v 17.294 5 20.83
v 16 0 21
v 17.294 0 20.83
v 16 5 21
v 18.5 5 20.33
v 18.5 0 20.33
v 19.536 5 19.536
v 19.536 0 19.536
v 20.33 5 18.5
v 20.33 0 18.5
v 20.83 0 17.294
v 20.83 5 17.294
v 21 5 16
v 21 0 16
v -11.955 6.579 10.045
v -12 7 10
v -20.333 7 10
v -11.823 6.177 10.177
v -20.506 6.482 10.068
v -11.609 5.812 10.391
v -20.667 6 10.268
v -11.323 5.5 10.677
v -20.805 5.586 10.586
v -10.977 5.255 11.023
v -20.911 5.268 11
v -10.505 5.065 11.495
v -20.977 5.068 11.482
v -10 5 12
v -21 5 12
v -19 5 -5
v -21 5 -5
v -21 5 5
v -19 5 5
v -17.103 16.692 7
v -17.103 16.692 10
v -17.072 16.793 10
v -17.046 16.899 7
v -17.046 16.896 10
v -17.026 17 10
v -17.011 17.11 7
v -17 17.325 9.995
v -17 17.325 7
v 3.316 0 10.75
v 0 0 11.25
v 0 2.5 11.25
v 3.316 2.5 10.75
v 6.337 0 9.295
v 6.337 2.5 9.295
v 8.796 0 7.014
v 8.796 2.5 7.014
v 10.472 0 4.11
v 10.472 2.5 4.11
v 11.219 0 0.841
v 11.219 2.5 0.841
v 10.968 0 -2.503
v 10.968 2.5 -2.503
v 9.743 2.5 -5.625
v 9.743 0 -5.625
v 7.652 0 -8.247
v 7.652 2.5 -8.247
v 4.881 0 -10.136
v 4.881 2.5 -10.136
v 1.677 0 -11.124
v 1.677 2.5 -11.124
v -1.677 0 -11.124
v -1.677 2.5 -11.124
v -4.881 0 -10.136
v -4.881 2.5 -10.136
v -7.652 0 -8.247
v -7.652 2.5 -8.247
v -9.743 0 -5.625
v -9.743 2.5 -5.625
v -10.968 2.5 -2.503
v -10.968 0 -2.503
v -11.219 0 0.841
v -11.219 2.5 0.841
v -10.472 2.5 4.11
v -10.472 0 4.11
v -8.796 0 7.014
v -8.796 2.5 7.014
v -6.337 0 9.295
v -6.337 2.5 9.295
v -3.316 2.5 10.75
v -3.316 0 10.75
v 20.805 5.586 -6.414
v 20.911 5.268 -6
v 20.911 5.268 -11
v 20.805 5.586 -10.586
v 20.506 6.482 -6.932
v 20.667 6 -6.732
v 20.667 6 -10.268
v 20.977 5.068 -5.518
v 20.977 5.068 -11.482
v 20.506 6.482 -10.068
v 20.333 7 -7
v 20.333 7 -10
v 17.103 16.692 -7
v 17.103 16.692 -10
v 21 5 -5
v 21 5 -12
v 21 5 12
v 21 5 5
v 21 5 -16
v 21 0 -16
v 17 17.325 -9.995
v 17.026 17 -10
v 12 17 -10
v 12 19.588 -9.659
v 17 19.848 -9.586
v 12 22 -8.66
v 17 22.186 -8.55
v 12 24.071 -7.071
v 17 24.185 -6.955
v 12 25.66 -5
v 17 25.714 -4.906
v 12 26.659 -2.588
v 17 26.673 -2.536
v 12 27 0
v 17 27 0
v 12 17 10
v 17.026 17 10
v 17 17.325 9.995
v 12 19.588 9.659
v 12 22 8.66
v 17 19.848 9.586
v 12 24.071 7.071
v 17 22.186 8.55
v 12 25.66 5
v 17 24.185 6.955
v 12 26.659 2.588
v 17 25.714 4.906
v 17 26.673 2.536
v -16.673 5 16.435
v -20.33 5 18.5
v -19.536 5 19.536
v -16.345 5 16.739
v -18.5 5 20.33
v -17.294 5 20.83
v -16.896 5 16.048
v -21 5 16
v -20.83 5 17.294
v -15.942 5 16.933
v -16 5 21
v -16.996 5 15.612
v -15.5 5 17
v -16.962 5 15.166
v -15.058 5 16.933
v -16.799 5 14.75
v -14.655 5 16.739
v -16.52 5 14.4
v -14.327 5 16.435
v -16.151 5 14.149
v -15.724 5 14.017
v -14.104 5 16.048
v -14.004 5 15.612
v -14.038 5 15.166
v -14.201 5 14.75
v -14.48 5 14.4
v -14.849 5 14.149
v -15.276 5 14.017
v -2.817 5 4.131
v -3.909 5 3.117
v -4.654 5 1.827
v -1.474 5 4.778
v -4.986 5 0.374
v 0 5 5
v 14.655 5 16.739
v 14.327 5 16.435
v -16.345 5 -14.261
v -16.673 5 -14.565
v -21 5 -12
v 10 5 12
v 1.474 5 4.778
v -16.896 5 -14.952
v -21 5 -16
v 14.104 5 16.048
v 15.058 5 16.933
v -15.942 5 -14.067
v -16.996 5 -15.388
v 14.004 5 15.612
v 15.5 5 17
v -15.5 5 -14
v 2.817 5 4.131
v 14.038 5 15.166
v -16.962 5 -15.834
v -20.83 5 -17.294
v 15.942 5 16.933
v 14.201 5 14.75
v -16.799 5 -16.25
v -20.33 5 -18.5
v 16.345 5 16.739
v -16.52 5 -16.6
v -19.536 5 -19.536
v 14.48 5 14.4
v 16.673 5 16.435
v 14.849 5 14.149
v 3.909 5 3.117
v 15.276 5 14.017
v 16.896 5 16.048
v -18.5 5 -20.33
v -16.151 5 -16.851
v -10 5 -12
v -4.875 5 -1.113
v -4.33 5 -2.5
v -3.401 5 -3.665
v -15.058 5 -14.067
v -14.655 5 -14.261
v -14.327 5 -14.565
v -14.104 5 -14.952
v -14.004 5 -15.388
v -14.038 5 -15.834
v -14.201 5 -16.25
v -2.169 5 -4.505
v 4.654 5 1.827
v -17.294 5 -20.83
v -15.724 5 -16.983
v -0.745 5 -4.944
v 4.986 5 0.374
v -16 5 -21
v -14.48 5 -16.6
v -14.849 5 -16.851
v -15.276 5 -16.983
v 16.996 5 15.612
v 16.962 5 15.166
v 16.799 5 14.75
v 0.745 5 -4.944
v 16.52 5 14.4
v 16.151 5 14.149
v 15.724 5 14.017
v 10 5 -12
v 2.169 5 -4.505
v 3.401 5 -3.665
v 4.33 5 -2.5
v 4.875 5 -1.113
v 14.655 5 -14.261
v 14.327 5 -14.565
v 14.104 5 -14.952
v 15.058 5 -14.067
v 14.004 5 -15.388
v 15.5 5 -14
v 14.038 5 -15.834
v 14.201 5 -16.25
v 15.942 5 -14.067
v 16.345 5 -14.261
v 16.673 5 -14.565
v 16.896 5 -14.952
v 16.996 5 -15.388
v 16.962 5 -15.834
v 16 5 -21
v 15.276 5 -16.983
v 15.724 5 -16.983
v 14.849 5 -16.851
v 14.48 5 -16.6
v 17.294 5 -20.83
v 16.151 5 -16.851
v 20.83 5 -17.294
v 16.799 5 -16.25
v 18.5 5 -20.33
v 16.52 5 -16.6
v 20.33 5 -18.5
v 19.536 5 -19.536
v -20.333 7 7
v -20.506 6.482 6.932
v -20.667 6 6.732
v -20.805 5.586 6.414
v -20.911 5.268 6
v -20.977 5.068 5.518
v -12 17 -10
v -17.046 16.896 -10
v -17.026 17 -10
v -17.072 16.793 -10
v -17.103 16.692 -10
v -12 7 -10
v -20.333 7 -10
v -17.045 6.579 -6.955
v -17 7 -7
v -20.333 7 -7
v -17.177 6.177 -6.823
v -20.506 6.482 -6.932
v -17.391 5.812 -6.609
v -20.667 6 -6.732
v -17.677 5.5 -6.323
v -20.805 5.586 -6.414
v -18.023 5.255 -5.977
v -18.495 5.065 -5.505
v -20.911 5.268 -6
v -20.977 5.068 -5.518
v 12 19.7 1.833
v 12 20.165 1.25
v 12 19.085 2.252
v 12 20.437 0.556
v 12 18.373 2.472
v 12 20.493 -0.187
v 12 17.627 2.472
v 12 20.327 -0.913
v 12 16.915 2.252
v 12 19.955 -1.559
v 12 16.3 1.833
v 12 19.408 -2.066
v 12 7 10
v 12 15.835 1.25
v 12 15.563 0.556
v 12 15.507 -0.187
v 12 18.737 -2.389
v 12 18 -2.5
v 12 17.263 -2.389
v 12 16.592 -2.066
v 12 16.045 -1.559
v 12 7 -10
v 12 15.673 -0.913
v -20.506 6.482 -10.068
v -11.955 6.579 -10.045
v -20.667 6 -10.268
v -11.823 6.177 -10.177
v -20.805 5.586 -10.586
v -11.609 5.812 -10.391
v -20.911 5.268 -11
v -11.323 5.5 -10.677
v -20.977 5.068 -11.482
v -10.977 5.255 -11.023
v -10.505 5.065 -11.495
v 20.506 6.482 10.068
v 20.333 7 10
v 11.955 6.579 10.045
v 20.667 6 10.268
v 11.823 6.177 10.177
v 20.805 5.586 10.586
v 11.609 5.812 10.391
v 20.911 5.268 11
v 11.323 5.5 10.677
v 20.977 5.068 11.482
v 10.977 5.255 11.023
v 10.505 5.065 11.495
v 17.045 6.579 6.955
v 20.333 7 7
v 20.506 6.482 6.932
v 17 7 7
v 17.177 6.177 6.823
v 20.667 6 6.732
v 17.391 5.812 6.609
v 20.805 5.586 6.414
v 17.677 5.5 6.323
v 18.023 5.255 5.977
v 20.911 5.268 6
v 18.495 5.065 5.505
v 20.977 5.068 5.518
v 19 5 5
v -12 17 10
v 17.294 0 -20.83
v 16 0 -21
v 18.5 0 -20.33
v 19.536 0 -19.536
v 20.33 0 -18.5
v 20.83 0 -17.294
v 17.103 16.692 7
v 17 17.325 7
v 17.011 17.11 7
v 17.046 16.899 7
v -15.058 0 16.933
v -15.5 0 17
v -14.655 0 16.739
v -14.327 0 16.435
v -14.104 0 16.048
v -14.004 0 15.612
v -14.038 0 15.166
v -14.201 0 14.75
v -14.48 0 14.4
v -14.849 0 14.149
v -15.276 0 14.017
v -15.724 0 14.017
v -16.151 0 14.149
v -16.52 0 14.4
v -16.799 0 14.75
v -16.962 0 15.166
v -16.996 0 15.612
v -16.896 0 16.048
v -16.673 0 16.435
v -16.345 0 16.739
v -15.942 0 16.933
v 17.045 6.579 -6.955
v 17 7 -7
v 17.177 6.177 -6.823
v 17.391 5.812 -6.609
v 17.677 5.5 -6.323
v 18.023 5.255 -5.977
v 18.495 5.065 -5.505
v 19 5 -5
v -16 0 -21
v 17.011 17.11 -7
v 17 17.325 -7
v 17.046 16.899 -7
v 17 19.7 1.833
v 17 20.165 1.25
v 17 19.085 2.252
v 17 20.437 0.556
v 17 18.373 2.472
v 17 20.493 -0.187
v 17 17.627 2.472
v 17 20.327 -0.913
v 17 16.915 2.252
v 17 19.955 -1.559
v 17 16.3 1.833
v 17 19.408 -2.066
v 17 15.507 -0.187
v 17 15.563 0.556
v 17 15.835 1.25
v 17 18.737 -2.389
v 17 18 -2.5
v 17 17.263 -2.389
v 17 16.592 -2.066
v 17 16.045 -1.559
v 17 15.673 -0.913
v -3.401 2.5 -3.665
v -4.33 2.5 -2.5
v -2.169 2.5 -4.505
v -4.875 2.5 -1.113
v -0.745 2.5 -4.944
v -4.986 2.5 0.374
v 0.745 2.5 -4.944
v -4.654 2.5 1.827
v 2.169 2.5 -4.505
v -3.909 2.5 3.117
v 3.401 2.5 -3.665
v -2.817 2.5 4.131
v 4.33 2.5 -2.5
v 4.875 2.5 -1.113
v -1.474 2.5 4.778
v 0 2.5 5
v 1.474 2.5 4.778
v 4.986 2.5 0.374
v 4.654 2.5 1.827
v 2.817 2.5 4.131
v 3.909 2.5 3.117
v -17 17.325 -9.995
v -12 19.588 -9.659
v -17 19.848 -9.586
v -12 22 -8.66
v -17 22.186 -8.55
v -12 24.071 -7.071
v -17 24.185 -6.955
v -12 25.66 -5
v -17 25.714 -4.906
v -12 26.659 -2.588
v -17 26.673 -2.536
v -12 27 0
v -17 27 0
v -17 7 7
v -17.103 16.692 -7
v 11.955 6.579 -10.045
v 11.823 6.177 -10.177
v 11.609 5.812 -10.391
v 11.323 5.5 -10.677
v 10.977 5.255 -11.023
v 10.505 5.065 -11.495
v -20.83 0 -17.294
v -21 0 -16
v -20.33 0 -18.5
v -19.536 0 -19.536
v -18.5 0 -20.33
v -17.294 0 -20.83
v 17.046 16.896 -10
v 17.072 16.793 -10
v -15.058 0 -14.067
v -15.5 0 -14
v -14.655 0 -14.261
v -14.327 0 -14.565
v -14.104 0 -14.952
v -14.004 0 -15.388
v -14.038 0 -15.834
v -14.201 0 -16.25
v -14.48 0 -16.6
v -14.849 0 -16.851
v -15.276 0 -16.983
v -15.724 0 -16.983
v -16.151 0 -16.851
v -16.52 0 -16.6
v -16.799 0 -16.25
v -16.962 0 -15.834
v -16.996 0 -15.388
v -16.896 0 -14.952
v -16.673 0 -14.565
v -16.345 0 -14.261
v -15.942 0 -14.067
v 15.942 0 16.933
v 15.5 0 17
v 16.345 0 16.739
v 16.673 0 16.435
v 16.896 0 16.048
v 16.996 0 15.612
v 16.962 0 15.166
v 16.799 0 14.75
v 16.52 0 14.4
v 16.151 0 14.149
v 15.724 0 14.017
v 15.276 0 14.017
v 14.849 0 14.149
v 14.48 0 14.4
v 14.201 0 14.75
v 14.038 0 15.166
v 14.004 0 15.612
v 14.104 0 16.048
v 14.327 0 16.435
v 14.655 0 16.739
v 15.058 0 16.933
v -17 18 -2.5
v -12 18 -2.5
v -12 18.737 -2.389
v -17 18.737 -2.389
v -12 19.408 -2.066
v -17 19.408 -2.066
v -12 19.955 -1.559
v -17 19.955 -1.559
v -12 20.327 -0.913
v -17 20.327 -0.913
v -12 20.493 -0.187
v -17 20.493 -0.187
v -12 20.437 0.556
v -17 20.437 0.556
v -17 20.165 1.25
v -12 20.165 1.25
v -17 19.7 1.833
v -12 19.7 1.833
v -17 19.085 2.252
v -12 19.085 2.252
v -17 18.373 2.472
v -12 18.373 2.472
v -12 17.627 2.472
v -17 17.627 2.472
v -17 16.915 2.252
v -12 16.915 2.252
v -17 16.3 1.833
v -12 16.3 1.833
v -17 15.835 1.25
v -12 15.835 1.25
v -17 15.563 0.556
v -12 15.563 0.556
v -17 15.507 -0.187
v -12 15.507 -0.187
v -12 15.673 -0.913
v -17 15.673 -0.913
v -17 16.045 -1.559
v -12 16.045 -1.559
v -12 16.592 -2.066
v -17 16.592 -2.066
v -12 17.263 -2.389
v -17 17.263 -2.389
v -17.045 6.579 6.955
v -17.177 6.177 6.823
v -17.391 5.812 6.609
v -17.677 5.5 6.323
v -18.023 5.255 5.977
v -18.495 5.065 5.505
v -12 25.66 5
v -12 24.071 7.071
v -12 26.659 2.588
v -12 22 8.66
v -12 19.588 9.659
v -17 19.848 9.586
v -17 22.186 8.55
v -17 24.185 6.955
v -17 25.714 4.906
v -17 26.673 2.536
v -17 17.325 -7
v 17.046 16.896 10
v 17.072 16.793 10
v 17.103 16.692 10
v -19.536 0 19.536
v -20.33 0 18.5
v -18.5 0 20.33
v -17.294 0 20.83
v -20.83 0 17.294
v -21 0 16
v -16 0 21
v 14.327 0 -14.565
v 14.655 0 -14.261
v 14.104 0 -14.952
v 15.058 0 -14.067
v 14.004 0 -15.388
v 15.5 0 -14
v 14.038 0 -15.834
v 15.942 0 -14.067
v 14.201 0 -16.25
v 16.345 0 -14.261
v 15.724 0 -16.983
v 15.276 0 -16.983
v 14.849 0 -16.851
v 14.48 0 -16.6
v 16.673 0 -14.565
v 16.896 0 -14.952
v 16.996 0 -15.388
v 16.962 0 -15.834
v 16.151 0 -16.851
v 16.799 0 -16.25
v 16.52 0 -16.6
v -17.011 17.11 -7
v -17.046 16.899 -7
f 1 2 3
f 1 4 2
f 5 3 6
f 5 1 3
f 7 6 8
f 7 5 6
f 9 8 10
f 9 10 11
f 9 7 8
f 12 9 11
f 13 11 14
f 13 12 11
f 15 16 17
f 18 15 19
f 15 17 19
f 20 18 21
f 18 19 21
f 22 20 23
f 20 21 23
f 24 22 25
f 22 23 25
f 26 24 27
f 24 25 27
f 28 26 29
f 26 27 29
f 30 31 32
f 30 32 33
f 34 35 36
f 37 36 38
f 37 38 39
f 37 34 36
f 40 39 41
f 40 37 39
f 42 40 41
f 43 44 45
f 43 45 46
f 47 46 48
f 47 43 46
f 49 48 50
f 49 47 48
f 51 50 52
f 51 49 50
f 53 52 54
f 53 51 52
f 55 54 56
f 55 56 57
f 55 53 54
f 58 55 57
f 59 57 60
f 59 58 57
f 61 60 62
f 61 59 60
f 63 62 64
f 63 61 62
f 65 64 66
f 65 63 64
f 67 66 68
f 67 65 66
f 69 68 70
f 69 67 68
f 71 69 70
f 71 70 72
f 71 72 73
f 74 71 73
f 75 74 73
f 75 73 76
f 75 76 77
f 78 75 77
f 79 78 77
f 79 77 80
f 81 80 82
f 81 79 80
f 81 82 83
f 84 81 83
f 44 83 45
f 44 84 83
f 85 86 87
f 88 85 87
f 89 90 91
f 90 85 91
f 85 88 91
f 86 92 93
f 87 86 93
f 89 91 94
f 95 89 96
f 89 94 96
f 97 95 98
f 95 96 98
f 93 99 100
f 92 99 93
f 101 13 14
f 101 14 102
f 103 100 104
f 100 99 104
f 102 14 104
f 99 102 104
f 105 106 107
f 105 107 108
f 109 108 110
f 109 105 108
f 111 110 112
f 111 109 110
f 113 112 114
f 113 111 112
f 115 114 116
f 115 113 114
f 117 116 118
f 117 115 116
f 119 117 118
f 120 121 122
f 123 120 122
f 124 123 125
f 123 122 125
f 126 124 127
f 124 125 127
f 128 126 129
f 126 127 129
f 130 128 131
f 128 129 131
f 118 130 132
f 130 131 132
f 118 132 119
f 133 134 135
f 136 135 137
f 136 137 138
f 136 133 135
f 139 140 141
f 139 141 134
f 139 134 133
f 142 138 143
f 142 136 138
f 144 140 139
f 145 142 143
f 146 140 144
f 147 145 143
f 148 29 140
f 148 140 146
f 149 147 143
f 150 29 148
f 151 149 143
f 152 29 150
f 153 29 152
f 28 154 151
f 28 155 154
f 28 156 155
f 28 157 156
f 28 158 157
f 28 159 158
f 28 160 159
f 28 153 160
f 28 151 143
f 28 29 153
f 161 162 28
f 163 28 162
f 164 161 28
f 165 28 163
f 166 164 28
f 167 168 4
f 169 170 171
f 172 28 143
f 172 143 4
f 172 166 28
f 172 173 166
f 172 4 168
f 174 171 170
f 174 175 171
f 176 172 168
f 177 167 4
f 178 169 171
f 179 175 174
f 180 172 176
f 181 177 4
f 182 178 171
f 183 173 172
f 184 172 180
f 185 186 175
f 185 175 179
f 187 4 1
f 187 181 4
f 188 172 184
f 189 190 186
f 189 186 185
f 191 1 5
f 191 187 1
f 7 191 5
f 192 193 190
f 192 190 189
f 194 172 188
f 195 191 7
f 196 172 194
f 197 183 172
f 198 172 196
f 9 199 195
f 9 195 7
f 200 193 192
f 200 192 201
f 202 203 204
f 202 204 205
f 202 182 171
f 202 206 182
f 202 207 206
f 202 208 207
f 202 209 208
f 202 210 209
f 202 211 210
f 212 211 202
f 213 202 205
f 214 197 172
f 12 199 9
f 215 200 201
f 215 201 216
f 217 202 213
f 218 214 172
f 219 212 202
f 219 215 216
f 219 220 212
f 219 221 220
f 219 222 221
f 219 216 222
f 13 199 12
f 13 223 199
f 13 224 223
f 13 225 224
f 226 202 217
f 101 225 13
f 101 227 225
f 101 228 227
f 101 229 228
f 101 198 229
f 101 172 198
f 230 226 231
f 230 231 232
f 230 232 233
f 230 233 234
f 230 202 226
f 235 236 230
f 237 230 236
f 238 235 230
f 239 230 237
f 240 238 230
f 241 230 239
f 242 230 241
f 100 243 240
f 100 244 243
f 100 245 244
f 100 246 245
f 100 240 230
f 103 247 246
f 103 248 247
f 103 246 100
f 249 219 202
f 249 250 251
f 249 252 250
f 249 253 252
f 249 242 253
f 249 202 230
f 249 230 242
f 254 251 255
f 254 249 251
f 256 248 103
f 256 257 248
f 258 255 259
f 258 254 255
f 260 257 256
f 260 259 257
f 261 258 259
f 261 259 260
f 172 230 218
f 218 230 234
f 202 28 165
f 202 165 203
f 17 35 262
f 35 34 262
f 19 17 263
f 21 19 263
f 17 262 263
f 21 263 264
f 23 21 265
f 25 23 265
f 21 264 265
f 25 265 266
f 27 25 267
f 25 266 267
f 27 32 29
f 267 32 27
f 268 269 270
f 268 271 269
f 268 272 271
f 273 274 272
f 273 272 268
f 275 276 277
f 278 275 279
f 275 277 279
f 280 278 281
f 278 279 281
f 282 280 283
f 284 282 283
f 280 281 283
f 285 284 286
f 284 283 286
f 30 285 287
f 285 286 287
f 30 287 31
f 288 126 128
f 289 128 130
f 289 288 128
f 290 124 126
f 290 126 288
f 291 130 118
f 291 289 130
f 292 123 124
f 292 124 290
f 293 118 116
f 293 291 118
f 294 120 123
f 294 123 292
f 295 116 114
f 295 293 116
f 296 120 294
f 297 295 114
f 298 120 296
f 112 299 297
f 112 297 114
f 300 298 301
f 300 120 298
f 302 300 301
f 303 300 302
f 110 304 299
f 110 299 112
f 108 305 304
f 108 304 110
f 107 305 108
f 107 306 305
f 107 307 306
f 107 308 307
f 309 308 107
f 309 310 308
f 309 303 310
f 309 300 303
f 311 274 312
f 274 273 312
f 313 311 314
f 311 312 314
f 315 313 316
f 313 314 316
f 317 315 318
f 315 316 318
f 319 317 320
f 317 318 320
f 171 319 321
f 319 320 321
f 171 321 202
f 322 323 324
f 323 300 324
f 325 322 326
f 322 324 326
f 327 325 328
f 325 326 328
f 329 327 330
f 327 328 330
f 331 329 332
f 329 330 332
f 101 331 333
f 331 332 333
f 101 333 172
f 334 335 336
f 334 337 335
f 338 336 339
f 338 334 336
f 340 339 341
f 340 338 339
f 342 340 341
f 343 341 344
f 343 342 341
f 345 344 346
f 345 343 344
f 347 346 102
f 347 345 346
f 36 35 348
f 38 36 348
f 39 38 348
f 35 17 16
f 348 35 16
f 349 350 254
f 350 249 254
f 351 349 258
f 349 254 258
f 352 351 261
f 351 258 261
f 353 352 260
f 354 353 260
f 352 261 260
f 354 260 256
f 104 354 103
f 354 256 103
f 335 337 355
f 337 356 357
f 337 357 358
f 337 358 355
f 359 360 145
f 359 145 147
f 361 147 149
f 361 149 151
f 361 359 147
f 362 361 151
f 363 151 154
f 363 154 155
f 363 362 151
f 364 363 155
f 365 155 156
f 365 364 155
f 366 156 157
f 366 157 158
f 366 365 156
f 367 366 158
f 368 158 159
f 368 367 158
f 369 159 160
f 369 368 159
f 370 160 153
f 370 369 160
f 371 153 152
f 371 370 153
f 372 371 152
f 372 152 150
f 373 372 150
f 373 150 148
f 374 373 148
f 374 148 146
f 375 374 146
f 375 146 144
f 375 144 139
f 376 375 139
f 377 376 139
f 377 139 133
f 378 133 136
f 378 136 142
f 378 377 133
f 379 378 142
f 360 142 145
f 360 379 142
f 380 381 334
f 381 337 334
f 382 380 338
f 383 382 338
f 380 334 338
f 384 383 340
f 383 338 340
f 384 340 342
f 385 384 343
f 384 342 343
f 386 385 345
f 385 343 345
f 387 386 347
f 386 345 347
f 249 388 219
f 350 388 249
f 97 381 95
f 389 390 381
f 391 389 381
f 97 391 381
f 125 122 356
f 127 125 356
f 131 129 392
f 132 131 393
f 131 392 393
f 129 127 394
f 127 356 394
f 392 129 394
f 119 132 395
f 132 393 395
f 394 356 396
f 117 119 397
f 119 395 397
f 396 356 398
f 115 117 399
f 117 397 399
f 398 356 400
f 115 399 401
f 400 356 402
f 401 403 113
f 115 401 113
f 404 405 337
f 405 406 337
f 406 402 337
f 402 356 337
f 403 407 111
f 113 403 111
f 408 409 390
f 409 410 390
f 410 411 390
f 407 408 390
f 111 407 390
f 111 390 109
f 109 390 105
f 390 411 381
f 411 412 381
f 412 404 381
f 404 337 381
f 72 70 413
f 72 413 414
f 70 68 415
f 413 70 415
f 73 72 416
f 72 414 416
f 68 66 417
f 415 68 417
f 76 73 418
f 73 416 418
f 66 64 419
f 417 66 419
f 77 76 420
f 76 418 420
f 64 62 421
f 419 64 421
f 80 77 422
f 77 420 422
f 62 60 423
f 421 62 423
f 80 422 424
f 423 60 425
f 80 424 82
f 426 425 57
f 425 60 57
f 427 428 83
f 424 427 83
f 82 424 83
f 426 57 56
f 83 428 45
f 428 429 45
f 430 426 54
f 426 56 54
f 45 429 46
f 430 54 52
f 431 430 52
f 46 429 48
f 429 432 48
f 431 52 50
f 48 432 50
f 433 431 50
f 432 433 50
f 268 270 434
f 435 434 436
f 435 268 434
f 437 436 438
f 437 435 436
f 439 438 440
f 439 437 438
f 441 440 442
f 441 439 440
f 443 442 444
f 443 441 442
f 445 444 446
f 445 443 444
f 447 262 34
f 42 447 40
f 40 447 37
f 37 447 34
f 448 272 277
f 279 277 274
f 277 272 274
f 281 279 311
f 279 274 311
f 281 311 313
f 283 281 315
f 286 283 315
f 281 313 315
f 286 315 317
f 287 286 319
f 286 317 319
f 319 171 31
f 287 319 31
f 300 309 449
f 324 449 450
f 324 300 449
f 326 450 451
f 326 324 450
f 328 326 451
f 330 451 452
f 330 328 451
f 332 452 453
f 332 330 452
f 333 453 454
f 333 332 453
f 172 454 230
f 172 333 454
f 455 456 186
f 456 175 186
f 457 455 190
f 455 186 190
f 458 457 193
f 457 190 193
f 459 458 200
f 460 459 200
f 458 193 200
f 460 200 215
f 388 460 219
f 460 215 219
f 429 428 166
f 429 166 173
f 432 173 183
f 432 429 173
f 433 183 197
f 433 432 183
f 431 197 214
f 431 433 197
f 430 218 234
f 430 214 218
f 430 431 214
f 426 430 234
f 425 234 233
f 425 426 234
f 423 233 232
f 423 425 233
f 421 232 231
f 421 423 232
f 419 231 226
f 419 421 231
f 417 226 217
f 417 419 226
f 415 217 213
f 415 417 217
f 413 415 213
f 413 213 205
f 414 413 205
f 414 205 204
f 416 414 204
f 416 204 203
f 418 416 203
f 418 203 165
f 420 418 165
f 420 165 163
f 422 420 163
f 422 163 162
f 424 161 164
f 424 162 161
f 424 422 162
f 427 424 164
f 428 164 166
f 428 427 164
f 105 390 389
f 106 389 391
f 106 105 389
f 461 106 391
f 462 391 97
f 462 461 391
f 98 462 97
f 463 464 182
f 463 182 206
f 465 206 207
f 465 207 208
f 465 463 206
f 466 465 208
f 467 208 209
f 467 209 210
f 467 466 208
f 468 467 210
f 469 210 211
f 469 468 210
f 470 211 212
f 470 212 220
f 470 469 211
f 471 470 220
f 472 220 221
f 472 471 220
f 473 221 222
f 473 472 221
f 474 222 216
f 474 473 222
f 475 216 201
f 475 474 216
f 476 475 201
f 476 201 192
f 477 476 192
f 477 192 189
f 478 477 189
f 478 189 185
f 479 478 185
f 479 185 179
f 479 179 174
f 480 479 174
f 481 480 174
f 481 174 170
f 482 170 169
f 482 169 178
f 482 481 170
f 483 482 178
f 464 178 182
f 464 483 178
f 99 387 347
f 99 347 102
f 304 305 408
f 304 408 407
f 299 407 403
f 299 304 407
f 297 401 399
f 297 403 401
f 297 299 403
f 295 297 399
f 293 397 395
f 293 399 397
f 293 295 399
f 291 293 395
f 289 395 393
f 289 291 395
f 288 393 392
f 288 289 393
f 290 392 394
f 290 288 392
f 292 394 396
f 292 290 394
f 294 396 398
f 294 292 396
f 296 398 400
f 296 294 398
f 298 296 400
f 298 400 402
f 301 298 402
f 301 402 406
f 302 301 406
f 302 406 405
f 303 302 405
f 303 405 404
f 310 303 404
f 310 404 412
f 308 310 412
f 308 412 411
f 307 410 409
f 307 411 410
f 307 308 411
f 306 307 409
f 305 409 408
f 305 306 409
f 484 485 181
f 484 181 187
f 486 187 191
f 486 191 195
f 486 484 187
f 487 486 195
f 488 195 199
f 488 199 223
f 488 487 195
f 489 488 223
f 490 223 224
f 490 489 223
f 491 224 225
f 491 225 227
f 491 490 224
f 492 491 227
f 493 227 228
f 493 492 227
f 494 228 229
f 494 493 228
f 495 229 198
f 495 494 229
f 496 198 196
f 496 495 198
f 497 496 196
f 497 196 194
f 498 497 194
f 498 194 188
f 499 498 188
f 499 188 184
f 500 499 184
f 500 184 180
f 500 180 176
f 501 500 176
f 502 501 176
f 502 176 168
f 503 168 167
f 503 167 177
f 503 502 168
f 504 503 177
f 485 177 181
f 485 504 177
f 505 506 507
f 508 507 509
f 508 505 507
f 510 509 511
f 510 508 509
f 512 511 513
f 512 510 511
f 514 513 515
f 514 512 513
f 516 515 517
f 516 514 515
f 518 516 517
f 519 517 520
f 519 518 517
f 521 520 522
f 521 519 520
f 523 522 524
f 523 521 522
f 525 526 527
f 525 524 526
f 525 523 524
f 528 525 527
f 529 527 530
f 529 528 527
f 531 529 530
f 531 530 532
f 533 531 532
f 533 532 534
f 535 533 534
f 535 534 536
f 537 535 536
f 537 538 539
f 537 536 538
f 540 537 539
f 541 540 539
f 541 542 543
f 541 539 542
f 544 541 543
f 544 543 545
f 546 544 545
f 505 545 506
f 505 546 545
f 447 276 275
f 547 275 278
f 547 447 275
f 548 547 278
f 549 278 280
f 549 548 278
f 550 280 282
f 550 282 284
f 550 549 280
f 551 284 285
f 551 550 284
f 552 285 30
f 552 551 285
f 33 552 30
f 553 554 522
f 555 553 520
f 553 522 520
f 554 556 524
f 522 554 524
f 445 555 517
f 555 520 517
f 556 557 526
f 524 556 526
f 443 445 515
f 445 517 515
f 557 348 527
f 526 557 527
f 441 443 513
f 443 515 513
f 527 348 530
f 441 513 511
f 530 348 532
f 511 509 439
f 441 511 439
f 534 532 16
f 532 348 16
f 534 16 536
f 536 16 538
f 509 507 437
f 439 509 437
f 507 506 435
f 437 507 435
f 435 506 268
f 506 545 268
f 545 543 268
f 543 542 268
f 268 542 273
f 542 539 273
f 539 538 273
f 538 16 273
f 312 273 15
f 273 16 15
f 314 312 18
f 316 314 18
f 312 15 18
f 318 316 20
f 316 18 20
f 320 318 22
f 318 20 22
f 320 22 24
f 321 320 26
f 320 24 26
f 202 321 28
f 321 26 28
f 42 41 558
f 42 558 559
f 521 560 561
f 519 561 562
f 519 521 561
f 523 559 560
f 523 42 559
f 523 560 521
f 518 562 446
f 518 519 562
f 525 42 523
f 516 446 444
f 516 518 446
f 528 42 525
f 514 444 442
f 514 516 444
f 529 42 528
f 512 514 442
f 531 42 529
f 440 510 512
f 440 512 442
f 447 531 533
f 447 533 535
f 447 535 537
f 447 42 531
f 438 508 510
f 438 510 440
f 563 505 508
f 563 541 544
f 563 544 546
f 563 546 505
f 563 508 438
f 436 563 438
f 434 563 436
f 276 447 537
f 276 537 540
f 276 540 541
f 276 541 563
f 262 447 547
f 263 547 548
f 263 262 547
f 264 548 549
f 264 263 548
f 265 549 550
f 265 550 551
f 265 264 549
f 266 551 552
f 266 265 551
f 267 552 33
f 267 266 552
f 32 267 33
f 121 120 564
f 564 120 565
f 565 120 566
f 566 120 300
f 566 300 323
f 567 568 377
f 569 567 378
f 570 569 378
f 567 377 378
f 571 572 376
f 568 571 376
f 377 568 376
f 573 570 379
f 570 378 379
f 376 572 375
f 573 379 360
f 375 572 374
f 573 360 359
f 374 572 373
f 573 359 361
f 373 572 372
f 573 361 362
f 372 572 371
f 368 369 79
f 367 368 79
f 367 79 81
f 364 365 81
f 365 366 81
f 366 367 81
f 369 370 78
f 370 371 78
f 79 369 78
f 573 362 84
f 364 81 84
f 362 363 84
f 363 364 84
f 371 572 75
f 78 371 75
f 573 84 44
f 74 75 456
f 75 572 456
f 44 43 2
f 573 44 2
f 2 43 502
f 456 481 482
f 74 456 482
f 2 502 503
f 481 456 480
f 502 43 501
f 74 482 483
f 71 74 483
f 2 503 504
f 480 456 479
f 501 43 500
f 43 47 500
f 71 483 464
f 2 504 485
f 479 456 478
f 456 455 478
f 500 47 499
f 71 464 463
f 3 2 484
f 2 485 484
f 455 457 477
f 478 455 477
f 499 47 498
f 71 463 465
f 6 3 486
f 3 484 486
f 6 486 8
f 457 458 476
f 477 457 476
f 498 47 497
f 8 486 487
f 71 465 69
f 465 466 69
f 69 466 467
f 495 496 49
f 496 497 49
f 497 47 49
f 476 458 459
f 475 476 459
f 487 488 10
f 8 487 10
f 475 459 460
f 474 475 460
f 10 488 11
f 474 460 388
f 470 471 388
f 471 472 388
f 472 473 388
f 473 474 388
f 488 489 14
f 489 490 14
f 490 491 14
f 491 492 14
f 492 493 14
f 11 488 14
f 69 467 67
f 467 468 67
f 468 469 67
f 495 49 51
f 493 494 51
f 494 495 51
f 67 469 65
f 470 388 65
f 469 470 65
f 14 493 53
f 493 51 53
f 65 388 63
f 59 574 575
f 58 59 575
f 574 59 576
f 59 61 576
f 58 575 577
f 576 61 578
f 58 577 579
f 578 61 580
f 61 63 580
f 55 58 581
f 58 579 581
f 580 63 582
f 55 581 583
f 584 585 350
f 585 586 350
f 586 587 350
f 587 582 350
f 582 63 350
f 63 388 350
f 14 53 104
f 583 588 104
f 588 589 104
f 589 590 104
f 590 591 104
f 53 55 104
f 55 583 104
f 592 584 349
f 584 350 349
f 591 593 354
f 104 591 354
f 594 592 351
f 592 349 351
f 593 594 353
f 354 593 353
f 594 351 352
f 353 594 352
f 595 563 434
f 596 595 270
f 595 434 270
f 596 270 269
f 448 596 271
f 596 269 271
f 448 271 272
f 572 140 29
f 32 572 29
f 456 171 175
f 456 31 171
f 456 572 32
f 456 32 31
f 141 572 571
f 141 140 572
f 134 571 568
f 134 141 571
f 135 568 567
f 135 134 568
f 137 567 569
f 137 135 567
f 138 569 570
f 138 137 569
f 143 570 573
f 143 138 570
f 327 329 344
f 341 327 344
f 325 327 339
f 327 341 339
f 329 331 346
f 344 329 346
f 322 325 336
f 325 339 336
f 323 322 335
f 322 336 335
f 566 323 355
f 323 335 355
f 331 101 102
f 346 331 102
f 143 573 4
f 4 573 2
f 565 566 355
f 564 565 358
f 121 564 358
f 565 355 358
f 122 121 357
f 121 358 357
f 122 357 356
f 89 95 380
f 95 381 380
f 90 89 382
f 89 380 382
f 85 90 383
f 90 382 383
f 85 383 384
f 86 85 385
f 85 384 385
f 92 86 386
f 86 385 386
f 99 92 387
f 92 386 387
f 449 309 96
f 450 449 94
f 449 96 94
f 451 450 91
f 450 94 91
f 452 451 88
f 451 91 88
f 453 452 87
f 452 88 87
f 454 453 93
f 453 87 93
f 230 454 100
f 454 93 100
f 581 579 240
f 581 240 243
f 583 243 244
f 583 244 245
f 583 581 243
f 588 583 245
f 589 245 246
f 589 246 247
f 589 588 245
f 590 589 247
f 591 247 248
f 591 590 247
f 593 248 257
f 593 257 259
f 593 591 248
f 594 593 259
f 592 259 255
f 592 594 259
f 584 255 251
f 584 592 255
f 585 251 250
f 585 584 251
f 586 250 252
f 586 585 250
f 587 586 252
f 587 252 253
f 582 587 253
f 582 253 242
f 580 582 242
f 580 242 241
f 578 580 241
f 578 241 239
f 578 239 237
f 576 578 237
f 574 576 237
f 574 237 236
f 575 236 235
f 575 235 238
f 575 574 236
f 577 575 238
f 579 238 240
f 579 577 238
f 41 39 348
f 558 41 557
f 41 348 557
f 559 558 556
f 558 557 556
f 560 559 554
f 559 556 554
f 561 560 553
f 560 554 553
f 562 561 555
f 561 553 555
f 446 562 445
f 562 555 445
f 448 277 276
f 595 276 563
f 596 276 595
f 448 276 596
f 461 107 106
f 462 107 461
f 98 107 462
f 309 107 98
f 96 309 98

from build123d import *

# Parameters (mm, degrees)
SKETCH1_W               = 42
SKETCH1_H               = 42
SKETCH1_R               = 1.5
BOSS_EXTRUDE1_DEPTH     = 5
SKETCH2_W               = 5
SKETCH2_H               = 20
BOSS_EXTRUDE2_DEPTH     = 27
CUT_EXTRUDE1_DEPTH      = 41.137264481
CUT_EXTRUDE1_DEPTH_BACK = 41.137264481
SKETCH3_R               = 2.5
FILLET1_R               = 10
FILLET2_R               = 5
SKETCH4_R               = 11.25
CUT_EXTRUDE2_DEPTH      = 2.5
SKETCH5_R               = 5
CUT_EXTRUDE3_DEPTH      = 10
SKETCH6_W               = 4
SKETCH6_H               = 3
BOSS_EXTRUDE3_DEPTH     = 17
CUT_EXTRUDE4_DEPTH      = 41.137264481
CUT_EXTRUDE4_DEPTH_BACK = 41.137264481
FILLET3_R               = 2


with BuildPart() as part:
    # Sketch1 → Boss-Extrude1 (new body)
    with BuildSketch(Plane(origin=(0, 0, 0), x_dir=(1, 0, 0), z_dir=(0, 1, 0))):
        Rectangle(SKETCH1_W, SKETCH1_H)
        with Locations(Location((-15.5, 15.5, 0), (0, 0, 270))):
            Circle(SKETCH1_R, mode=Mode.SUBTRACT)
        with Locations(Location((15.5, 15.5, 0), (0, 0, 270))):
            Circle(SKETCH1_R, mode=Mode.SUBTRACT)
        with Locations(Location((15.5, -15.5, 0), (0, 0, 270))):
            Circle(SKETCH1_R, mode=Mode.SUBTRACT)
        with Locations(Location((-15.5, -15.5, 0), (0, 0, 270))):
            Circle(SKETCH1_R, mode=Mode.SUBTRACT)
    extrude(amount=BOSS_EXTRUDE1_DEPTH)

    # Sketch2 → Boss-Extrude2 (add)
    with BuildSketch(Plane(origin=(0, 0, 0), x_dir=(1, 0, 0), z_dir=(0, 1, 0))):
        with Locations((-14.5, 0)):
            Rectangle(SKETCH2_W, SKETCH2_H)
        with Locations((14.5, 0)):
            Rectangle(SKETCH2_W, SKETCH2_H)
    extrude(amount=BOSS_EXTRUDE2_DEPTH)

    # Sketch3 → Cut-Extrude1 (cut, two sides: drawn at the far end of the back side and taken through both)
    with BuildSketch(Plane(origin=(0, 0, 0), x_dir=(0, 0, -1), z_dir=(1, 0, 0)).offset(-CUT_EXTRUDE1_DEPTH_BACK)):
        with Locations((0, 18)):
            Circle(SKETCH3_R)
    extrude(amount=CUT_EXTRUDE1_DEPTH + CUT_EXTRUDE1_DEPTH_BACK, mode=Mode.SUBTRACT)

    # Fillet1
    fillet1_edges = [part.edges().sort_by_distance(p)[0] for p in [
        (-14.5, 27, 10),
        (-14.5, 27, -10),
        (14.5, 27, -10),
        (14.5, 27, 10),
    ]]
    fillet(fillet1_edges, radius=FILLET1_R - 0.0001)  # a hair under: the kernel refuses the full size

    # Fillet2
    fillet2_edges = [part.edges().sort_by_distance(p)[0] for p in [
        (21, 2.5, 21),
        (-21, 2.5, 21),
        (-21, 2.5, -21),
        (21, 2.5, -21),
    ]]
    fillet(fillet2_edges, radius=FILLET2_R)

    # Sketch4 → Cut-Extrude2 (cut)
    with BuildSketch(Plane(origin=(0, 0, 0), x_dir=(1, 0, 0), z_dir=(0, 1, 0))):
        with Locations(Location((0, 0, 0), (0, 0, 270))):
            Circle(SKETCH4_R)
    extrude(amount=CUT_EXTRUDE2_DEPTH, mode=Mode.SUBTRACT)

    # Sketch5 → Cut-Extrude3 (cut)
    with BuildSketch(Plane(origin=(0, 0, 0), x_dir=(1, 0, 0), z_dir=(0, 1, 0))):
        with Locations(Location((0, 0, 0), (0, 0, 270))):
            Circle(SKETCH5_R)
    extrude(amount=CUT_EXTRUDE3_DEPTH, mode=Mode.SUBTRACT)

    # Sketch6 → Boss-Extrude3 (add)
    with BuildSketch(Plane(origin=(0, 0, 0), x_dir=(1, 0, 0), z_dir=(0, 1, 0))):
        with Locations((-19, 8.5)):
            Rectangle(SKETCH6_W, SKETCH6_H)
        with Locations((-19, -8.5)):
            Rectangle(SKETCH6_W, SKETCH6_H)
        with Locations((19, -8.5)):
            Rectangle(SKETCH6_W, SKETCH6_H)
        with Locations((19, 8.5)):
            Rectangle(SKETCH6_W, SKETCH6_H)
    extrude(amount=BOSS_EXTRUDE3_DEPTH)

    # Sketch7 → Cut-Extrude4 (cut, two sides: drawn at the far end of the back side and taken through both)
    with BuildSketch(Plane.XY.offset(-CUT_EXTRUDE4_DEPTH_BACK)):
        Polygon((-17, 17), (-21, 5), (-21, 17), align=None)
        Polygon((17, 17), (21, 17), (21, 5), align=None)
    extrude(amount=CUT_EXTRUDE4_DEPTH + CUT_EXTRUDE4_DEPTH_BACK, mode=Mode.SUBTRACT)

    # Fillet3
    fillet3_edges = [part.edges().sort_by_distance(p)[0] for p in [
        (-19, 5, -7),
        (-17, 17, -8.5),
        (-17, 5, 0),
        (-19, 5, 7),
        (-17, 17, 8.5),
        (19, 5, 7),
        (17, 17, 8.5),
        (17, 5, 0),
        (19, 5, -7),
        (17, 17, -8.5),
        (-16.5, 5, 10),
        (-12, 5, 0),
        (-16.5, 5, -10),
        (16.5, 5, -10),
        (12, 5, 0),
        (16.5, 5, 10),
    ]]
    fillet(fillet3_edges, radius=FILLET3_R)


solid = part.part
